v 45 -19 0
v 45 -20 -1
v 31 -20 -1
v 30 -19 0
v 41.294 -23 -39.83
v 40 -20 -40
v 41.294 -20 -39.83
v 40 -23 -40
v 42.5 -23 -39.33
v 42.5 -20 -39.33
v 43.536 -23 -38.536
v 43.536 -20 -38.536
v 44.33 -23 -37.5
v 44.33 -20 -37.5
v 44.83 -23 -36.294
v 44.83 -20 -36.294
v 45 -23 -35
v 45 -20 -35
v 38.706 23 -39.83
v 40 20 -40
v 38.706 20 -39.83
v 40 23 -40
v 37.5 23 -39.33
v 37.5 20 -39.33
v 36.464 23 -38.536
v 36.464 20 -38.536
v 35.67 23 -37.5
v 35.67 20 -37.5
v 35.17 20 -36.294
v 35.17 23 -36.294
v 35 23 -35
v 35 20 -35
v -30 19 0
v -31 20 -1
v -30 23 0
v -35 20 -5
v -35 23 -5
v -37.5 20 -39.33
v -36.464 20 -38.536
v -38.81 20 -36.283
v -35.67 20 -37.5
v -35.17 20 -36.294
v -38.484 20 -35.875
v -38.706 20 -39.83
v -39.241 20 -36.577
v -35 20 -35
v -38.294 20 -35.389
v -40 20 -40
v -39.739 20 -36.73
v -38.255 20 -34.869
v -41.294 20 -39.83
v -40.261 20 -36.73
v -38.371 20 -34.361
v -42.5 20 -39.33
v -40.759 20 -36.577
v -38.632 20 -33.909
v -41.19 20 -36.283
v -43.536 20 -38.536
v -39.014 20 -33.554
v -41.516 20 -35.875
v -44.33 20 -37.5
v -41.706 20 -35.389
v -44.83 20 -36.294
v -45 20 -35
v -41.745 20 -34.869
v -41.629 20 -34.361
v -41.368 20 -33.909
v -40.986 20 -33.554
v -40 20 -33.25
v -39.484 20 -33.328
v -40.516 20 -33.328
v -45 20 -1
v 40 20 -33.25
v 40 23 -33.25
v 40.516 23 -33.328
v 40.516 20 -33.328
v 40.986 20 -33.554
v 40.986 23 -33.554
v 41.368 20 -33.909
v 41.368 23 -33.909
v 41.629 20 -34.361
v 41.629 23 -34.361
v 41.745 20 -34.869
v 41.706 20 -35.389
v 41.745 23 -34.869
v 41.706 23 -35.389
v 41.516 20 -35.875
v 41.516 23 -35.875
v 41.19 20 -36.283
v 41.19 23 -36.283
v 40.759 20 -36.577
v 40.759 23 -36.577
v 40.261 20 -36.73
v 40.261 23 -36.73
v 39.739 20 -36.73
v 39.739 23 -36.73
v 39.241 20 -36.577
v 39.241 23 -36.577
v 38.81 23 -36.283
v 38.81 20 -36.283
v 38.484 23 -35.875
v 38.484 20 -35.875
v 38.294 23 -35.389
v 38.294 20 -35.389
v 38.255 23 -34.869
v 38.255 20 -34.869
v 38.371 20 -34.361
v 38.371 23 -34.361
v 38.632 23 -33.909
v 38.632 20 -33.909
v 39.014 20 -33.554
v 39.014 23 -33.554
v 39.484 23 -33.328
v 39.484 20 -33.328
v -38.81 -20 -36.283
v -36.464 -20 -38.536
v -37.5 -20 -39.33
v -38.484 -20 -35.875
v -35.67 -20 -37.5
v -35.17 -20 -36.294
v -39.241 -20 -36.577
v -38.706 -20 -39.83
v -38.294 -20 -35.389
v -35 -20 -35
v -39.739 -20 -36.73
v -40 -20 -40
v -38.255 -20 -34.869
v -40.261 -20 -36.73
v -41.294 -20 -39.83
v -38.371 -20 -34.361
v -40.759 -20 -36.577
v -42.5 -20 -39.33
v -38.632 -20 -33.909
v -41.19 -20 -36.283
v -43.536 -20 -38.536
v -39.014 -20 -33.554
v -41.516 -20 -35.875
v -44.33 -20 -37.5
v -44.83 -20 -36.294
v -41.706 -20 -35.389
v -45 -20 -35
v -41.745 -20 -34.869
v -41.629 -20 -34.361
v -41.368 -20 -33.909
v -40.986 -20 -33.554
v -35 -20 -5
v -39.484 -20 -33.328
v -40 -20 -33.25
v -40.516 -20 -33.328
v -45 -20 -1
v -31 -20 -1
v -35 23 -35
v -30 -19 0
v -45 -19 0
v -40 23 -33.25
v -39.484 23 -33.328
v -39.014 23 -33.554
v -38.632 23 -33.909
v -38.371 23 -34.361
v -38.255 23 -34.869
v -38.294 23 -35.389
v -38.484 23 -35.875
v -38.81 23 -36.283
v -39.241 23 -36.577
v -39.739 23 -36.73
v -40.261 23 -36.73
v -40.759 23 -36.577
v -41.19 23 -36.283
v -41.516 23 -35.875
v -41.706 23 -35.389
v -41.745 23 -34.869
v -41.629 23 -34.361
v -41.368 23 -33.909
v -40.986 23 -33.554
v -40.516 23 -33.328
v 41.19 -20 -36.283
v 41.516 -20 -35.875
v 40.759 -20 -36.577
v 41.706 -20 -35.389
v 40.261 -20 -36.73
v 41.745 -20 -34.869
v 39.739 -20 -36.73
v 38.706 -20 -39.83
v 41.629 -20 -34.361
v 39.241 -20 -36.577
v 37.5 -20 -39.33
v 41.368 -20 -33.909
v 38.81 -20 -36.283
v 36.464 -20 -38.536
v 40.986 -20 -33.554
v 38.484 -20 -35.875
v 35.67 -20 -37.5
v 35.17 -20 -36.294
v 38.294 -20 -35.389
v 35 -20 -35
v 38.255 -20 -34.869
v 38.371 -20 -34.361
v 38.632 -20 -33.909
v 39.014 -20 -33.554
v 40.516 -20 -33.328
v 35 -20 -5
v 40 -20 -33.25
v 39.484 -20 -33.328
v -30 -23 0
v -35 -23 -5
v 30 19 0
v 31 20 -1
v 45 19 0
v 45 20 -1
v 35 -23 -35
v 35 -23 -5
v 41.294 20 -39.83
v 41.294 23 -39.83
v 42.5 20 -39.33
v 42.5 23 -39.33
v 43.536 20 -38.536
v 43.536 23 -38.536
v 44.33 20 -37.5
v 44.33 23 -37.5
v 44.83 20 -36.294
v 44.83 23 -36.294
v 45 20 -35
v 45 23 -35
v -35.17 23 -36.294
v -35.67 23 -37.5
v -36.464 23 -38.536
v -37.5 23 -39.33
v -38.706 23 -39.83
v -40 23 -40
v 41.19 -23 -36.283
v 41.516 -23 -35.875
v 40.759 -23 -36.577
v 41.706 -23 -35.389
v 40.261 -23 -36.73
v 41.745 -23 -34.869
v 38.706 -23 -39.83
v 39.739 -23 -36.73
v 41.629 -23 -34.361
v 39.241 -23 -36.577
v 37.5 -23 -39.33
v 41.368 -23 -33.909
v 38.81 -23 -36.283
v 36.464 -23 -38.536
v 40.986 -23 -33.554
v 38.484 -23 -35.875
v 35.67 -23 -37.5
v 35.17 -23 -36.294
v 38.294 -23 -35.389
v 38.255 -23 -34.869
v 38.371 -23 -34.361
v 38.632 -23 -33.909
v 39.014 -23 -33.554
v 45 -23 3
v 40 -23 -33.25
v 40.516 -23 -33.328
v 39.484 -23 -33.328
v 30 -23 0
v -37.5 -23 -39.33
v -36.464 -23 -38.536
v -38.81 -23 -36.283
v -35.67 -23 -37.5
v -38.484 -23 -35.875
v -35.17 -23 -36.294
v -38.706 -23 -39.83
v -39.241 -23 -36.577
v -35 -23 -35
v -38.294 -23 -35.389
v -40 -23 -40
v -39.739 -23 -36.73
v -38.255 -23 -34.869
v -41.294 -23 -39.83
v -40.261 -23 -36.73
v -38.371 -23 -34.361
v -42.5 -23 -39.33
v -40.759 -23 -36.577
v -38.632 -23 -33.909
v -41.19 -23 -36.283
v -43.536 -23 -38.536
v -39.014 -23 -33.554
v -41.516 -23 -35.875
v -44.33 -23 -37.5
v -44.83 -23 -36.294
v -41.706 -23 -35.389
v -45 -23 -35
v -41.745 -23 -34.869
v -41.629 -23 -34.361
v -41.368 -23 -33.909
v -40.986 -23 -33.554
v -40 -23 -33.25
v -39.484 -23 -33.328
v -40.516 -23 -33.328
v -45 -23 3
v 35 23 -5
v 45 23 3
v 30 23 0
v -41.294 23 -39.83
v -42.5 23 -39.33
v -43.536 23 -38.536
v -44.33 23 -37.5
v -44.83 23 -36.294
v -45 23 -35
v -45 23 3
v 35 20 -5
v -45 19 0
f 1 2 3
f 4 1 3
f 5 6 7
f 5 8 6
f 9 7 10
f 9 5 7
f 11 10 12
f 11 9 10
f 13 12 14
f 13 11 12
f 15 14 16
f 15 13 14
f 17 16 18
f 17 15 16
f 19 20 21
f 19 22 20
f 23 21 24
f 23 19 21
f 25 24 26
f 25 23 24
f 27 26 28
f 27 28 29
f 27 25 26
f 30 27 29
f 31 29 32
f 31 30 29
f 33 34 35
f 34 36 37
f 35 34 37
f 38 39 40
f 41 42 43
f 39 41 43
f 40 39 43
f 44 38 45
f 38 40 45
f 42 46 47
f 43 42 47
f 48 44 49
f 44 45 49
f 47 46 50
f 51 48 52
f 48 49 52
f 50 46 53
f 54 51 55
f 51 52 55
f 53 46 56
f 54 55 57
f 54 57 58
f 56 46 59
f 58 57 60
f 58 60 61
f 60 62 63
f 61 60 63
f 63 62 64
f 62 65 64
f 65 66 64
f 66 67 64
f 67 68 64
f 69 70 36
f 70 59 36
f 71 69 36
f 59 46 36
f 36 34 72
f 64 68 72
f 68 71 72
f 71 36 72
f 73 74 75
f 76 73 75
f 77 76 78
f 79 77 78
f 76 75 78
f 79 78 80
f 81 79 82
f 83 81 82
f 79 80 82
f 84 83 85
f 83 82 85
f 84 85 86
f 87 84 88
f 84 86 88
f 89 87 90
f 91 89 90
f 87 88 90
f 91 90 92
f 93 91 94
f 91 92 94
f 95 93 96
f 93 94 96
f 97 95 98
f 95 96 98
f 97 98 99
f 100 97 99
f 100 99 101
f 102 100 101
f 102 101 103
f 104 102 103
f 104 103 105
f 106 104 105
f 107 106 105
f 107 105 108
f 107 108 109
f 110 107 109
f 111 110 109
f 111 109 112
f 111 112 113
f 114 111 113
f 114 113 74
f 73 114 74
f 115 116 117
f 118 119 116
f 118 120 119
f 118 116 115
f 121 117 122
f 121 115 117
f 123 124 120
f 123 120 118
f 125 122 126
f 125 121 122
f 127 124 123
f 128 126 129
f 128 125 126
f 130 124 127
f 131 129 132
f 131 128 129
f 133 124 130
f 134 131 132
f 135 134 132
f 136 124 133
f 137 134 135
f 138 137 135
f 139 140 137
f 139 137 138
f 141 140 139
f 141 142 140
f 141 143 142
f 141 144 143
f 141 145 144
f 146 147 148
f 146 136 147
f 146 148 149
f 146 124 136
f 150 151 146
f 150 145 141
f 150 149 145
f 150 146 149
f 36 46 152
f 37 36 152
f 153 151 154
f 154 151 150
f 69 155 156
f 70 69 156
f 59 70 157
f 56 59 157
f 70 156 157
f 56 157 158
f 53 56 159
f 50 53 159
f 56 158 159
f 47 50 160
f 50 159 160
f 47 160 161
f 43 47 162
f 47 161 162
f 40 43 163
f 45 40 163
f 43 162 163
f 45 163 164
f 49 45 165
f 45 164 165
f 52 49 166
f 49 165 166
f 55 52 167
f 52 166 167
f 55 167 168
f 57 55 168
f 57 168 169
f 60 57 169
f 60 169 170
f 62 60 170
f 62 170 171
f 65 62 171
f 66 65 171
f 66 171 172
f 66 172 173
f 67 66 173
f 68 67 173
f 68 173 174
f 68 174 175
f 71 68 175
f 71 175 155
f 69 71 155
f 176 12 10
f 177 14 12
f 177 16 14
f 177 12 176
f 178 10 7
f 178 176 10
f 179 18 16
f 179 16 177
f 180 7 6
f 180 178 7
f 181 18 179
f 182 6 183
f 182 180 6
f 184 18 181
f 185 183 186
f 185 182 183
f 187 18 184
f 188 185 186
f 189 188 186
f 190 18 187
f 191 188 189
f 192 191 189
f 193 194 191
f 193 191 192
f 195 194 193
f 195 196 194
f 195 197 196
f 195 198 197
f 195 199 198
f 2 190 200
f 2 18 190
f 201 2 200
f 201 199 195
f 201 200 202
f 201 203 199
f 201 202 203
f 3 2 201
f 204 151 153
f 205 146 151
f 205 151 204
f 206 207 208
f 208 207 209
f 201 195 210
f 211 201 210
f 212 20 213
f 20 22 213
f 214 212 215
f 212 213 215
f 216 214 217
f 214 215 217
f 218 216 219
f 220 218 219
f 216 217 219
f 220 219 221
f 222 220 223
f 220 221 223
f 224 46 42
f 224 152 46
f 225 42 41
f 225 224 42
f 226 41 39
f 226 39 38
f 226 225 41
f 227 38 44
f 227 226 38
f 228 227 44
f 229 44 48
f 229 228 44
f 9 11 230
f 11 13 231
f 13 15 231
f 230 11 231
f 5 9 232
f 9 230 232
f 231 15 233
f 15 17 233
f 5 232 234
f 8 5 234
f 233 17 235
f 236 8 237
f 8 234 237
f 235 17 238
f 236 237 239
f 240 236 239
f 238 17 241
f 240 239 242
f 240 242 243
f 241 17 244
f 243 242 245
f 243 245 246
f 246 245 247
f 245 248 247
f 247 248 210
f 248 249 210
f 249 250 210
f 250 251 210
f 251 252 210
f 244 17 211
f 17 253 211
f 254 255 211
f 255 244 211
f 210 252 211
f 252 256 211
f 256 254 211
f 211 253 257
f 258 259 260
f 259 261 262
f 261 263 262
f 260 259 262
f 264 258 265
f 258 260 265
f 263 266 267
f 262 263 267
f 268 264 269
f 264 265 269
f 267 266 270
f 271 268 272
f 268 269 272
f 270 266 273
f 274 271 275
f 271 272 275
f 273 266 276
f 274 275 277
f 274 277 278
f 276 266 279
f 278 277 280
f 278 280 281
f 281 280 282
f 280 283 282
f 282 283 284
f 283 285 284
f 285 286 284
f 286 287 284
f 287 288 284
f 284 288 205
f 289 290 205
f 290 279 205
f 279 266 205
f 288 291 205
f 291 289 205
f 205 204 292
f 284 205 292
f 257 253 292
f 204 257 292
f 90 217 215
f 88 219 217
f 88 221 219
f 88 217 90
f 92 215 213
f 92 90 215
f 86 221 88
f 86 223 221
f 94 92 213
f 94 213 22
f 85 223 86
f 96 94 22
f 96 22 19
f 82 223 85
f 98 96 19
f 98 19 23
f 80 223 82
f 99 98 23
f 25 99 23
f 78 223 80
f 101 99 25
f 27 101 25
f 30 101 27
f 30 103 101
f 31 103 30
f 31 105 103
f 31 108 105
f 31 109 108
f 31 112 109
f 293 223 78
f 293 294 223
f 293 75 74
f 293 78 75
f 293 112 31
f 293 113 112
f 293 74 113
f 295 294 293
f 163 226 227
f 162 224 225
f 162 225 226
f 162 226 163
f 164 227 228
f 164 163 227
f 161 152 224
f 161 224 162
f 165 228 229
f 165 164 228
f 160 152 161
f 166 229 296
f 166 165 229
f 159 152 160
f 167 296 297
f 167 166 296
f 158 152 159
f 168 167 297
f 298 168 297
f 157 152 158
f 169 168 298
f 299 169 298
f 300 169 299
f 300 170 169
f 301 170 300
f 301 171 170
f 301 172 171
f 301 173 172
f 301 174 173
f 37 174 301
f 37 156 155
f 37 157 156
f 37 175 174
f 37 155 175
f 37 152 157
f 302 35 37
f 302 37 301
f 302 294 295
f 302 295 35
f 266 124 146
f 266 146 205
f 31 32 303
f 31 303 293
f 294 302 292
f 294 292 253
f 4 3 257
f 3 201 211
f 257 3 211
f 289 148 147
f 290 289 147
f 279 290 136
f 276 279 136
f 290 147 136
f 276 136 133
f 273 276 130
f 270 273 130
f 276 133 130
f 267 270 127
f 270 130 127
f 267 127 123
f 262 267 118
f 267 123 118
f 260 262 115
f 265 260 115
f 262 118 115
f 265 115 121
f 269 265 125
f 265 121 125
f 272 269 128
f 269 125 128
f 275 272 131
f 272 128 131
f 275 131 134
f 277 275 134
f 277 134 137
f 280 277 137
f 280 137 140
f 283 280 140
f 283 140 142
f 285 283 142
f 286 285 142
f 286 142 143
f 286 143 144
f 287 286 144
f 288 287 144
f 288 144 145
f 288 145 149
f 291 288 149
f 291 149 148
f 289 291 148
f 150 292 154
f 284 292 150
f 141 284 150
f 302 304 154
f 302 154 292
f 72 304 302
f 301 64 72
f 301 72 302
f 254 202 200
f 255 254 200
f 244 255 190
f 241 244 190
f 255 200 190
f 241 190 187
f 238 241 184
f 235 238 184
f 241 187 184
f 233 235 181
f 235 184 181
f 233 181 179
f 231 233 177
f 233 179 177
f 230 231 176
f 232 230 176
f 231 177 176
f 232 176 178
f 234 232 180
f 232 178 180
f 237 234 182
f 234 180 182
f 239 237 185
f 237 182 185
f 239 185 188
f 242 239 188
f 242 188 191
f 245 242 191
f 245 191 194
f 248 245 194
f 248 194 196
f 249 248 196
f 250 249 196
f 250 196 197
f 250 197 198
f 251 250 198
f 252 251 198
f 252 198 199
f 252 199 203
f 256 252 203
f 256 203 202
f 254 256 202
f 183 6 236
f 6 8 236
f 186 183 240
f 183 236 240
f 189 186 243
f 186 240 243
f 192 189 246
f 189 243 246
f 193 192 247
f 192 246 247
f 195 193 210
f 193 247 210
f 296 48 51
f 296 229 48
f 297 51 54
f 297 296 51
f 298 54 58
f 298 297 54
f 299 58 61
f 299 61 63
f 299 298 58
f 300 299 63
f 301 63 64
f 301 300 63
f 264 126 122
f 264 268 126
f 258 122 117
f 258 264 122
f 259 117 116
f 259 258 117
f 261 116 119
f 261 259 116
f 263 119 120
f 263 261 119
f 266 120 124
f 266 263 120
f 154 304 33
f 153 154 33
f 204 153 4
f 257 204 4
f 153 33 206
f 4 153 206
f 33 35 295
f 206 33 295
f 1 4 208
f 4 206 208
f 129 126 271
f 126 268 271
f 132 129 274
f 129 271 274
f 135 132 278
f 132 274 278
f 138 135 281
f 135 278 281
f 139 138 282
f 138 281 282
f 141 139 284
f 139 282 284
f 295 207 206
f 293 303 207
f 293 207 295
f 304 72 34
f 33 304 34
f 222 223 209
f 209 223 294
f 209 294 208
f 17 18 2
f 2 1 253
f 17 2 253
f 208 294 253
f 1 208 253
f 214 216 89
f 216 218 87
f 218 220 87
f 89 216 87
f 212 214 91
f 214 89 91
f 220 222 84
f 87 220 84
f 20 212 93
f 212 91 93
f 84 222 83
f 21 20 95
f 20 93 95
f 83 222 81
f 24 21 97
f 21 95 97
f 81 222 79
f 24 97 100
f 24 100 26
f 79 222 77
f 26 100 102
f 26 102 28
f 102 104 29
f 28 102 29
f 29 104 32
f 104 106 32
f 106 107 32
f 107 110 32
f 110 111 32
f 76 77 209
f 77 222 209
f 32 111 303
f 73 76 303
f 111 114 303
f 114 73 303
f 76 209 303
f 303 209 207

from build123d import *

# Parameters (mm, degrees)
SZKIC1_W                    = 90
SZKIC1_H                    = 46
DODANIE_WYCI_GNI_CIE1_DEPTH = 3
SZKIC2_W                    = 10
SZKIC2_H                    = 3
DODANIE_WYCI_GNI_CIE2_DEPTH = 40
SFAZOWANIE1_SIZE            = 5
SFAZOWANIE2_SIZE            = 1
ZAOKR_GLENIE1_R             = 5
SFAZOWANIE1_OF_LUSTRO1_SIZE = 5
SFAZOWANIE2_OF_LUSTRO1_SIZE = 1
ZAOKR_GLENIE1_OF_LUSTRO1_R  = 5
SZKIC3_R                    = 1.75
WYTNIJ_WYCI_GNI_CIE1_DEPTH  = 76.769386958


with BuildPart() as part:
    # Szkic1 → Dodanie-wyciągnięcie1 (new body)
    with BuildSketch(Plane.XY):
        Rectangle(SZKIC1_W, SZKIC1_H)
    extrude(amount=DODANIE_WYCI_GNI_CIE1_DEPTH)

    # Szkic2 → Dodanie-wyciągnięcie2 (add)
    with BuildSketch(Plane(origin=(0, 0, 0), x_dir=(-1, 0, 0), z_dir=(0, 0, -1))):
        with Locations((-40, 21.5)):
            Rectangle(SZKIC2_W, SZKIC2_H)
        with Locations((40, 21.5)):
            Rectangle(SZKIC2_W, SZKIC2_H)
    dodanie_wyci_gni_cie2 = extrude(amount=DODANIE_WYCI_GNI_CIE2_DEPTH)

    # Sfazowanie1
    sfazowanie1_edges = [part.edges().sort_by_distance(p)[0] for p in [
        (35, 21.5, 0),
        (-35, 21.5, 0),
    ]]
    chamfer(sfazowanie1_edges, length=SFAZOWANIE1_SIZE)

    # Sfazowanie2
    sfazowanie2_edges = [part.edges().sort_by_distance(p)[0] for p in [
        (37.5, 20, 0),
        (-37.5, 20, 0),
    ]]
    chamfer(sfazowanie2_edges, length=SFAZOWANIE2_SIZE)

    # Zaokrąglenie1
    zaokr_glenie1_edges = [part.edges().sort_by_distance(p)[0] for p in [
        (35, 21.5, -40),
        (45, 21.5, -40),
        (-35, 21.5, -40),
        (-45, 21.5, -40),
    ]]
    fillet(zaokr_glenie1_edges, radius=ZAOKR_GLENIE1_R - 0.0001)  # a hair under: the kernel refuses the full size

    # Lustro1: Dodanie-wyciągnięcie2 across plane
    add(dodanie_wyci_gni_cie2.mirror(Plane.ZX))

    # Sfazowanie1 of Lustro1
    sfazowanie1_of_lustro1_edges = [part.edges().sort_by_distance(p)[0] for p in [
        (35, -21.5, 0),
        (-35, -21.5, 0),
    ]]
    chamfer(sfazowanie1_of_lustro1_edges, length=SFAZOWANIE1_OF_LUSTRO1_SIZE)

    # Sfazowanie2 of Lustro1
    sfazowanie2_of_lustro1_edges = [part.edges().sort_by_distance(p)[0] for p in [
        (37.5, -20, 0),
        (-37.5, -20, 0),
    ]]
    chamfer(sfazowanie2_of_lustro1_edges, length=SFAZOWANIE2_OF_LUSTRO1_SIZE)

    # Zaokrąglenie1 of Lustro1
    zaokr_glenie1_of_lustro1_edges = [part.edges().sort_by_distance(p)[0] for p in [
        (35, -21.5, -40),
        (45, -21.5, -40),
        (-35, -21.5, -40),
        (-45, -21.5, -40),
    ]]
    fillet(zaokr_glenie1_of_lustro1_edges, radius=ZAOKR_GLENIE1_OF_LUSTRO1_R - 0.0001)  # a hair under: the kernel refuses the full size

    # Szkic3 → Wytnij-wyciągnięcie1 (cut, through all)
    with BuildSketch(Plane(origin=(0, 23, 0), x_dir=(1, 0, 0), z_dir=(0, 1, 0))):
        with Locations(Location((-40, 35, 0), (0, 0, 270))):
            Circle(SZKIC3_R)
        with Locations(Location((40, 35, 0), (0, 0, 270))):
            Circle(SZKIC3_R)
    extrude(amount=-WYTNIJ_WYCI_GNI_CIE1_DEPTH, mode=Mode.SUBTRACT)


solid = part.part
